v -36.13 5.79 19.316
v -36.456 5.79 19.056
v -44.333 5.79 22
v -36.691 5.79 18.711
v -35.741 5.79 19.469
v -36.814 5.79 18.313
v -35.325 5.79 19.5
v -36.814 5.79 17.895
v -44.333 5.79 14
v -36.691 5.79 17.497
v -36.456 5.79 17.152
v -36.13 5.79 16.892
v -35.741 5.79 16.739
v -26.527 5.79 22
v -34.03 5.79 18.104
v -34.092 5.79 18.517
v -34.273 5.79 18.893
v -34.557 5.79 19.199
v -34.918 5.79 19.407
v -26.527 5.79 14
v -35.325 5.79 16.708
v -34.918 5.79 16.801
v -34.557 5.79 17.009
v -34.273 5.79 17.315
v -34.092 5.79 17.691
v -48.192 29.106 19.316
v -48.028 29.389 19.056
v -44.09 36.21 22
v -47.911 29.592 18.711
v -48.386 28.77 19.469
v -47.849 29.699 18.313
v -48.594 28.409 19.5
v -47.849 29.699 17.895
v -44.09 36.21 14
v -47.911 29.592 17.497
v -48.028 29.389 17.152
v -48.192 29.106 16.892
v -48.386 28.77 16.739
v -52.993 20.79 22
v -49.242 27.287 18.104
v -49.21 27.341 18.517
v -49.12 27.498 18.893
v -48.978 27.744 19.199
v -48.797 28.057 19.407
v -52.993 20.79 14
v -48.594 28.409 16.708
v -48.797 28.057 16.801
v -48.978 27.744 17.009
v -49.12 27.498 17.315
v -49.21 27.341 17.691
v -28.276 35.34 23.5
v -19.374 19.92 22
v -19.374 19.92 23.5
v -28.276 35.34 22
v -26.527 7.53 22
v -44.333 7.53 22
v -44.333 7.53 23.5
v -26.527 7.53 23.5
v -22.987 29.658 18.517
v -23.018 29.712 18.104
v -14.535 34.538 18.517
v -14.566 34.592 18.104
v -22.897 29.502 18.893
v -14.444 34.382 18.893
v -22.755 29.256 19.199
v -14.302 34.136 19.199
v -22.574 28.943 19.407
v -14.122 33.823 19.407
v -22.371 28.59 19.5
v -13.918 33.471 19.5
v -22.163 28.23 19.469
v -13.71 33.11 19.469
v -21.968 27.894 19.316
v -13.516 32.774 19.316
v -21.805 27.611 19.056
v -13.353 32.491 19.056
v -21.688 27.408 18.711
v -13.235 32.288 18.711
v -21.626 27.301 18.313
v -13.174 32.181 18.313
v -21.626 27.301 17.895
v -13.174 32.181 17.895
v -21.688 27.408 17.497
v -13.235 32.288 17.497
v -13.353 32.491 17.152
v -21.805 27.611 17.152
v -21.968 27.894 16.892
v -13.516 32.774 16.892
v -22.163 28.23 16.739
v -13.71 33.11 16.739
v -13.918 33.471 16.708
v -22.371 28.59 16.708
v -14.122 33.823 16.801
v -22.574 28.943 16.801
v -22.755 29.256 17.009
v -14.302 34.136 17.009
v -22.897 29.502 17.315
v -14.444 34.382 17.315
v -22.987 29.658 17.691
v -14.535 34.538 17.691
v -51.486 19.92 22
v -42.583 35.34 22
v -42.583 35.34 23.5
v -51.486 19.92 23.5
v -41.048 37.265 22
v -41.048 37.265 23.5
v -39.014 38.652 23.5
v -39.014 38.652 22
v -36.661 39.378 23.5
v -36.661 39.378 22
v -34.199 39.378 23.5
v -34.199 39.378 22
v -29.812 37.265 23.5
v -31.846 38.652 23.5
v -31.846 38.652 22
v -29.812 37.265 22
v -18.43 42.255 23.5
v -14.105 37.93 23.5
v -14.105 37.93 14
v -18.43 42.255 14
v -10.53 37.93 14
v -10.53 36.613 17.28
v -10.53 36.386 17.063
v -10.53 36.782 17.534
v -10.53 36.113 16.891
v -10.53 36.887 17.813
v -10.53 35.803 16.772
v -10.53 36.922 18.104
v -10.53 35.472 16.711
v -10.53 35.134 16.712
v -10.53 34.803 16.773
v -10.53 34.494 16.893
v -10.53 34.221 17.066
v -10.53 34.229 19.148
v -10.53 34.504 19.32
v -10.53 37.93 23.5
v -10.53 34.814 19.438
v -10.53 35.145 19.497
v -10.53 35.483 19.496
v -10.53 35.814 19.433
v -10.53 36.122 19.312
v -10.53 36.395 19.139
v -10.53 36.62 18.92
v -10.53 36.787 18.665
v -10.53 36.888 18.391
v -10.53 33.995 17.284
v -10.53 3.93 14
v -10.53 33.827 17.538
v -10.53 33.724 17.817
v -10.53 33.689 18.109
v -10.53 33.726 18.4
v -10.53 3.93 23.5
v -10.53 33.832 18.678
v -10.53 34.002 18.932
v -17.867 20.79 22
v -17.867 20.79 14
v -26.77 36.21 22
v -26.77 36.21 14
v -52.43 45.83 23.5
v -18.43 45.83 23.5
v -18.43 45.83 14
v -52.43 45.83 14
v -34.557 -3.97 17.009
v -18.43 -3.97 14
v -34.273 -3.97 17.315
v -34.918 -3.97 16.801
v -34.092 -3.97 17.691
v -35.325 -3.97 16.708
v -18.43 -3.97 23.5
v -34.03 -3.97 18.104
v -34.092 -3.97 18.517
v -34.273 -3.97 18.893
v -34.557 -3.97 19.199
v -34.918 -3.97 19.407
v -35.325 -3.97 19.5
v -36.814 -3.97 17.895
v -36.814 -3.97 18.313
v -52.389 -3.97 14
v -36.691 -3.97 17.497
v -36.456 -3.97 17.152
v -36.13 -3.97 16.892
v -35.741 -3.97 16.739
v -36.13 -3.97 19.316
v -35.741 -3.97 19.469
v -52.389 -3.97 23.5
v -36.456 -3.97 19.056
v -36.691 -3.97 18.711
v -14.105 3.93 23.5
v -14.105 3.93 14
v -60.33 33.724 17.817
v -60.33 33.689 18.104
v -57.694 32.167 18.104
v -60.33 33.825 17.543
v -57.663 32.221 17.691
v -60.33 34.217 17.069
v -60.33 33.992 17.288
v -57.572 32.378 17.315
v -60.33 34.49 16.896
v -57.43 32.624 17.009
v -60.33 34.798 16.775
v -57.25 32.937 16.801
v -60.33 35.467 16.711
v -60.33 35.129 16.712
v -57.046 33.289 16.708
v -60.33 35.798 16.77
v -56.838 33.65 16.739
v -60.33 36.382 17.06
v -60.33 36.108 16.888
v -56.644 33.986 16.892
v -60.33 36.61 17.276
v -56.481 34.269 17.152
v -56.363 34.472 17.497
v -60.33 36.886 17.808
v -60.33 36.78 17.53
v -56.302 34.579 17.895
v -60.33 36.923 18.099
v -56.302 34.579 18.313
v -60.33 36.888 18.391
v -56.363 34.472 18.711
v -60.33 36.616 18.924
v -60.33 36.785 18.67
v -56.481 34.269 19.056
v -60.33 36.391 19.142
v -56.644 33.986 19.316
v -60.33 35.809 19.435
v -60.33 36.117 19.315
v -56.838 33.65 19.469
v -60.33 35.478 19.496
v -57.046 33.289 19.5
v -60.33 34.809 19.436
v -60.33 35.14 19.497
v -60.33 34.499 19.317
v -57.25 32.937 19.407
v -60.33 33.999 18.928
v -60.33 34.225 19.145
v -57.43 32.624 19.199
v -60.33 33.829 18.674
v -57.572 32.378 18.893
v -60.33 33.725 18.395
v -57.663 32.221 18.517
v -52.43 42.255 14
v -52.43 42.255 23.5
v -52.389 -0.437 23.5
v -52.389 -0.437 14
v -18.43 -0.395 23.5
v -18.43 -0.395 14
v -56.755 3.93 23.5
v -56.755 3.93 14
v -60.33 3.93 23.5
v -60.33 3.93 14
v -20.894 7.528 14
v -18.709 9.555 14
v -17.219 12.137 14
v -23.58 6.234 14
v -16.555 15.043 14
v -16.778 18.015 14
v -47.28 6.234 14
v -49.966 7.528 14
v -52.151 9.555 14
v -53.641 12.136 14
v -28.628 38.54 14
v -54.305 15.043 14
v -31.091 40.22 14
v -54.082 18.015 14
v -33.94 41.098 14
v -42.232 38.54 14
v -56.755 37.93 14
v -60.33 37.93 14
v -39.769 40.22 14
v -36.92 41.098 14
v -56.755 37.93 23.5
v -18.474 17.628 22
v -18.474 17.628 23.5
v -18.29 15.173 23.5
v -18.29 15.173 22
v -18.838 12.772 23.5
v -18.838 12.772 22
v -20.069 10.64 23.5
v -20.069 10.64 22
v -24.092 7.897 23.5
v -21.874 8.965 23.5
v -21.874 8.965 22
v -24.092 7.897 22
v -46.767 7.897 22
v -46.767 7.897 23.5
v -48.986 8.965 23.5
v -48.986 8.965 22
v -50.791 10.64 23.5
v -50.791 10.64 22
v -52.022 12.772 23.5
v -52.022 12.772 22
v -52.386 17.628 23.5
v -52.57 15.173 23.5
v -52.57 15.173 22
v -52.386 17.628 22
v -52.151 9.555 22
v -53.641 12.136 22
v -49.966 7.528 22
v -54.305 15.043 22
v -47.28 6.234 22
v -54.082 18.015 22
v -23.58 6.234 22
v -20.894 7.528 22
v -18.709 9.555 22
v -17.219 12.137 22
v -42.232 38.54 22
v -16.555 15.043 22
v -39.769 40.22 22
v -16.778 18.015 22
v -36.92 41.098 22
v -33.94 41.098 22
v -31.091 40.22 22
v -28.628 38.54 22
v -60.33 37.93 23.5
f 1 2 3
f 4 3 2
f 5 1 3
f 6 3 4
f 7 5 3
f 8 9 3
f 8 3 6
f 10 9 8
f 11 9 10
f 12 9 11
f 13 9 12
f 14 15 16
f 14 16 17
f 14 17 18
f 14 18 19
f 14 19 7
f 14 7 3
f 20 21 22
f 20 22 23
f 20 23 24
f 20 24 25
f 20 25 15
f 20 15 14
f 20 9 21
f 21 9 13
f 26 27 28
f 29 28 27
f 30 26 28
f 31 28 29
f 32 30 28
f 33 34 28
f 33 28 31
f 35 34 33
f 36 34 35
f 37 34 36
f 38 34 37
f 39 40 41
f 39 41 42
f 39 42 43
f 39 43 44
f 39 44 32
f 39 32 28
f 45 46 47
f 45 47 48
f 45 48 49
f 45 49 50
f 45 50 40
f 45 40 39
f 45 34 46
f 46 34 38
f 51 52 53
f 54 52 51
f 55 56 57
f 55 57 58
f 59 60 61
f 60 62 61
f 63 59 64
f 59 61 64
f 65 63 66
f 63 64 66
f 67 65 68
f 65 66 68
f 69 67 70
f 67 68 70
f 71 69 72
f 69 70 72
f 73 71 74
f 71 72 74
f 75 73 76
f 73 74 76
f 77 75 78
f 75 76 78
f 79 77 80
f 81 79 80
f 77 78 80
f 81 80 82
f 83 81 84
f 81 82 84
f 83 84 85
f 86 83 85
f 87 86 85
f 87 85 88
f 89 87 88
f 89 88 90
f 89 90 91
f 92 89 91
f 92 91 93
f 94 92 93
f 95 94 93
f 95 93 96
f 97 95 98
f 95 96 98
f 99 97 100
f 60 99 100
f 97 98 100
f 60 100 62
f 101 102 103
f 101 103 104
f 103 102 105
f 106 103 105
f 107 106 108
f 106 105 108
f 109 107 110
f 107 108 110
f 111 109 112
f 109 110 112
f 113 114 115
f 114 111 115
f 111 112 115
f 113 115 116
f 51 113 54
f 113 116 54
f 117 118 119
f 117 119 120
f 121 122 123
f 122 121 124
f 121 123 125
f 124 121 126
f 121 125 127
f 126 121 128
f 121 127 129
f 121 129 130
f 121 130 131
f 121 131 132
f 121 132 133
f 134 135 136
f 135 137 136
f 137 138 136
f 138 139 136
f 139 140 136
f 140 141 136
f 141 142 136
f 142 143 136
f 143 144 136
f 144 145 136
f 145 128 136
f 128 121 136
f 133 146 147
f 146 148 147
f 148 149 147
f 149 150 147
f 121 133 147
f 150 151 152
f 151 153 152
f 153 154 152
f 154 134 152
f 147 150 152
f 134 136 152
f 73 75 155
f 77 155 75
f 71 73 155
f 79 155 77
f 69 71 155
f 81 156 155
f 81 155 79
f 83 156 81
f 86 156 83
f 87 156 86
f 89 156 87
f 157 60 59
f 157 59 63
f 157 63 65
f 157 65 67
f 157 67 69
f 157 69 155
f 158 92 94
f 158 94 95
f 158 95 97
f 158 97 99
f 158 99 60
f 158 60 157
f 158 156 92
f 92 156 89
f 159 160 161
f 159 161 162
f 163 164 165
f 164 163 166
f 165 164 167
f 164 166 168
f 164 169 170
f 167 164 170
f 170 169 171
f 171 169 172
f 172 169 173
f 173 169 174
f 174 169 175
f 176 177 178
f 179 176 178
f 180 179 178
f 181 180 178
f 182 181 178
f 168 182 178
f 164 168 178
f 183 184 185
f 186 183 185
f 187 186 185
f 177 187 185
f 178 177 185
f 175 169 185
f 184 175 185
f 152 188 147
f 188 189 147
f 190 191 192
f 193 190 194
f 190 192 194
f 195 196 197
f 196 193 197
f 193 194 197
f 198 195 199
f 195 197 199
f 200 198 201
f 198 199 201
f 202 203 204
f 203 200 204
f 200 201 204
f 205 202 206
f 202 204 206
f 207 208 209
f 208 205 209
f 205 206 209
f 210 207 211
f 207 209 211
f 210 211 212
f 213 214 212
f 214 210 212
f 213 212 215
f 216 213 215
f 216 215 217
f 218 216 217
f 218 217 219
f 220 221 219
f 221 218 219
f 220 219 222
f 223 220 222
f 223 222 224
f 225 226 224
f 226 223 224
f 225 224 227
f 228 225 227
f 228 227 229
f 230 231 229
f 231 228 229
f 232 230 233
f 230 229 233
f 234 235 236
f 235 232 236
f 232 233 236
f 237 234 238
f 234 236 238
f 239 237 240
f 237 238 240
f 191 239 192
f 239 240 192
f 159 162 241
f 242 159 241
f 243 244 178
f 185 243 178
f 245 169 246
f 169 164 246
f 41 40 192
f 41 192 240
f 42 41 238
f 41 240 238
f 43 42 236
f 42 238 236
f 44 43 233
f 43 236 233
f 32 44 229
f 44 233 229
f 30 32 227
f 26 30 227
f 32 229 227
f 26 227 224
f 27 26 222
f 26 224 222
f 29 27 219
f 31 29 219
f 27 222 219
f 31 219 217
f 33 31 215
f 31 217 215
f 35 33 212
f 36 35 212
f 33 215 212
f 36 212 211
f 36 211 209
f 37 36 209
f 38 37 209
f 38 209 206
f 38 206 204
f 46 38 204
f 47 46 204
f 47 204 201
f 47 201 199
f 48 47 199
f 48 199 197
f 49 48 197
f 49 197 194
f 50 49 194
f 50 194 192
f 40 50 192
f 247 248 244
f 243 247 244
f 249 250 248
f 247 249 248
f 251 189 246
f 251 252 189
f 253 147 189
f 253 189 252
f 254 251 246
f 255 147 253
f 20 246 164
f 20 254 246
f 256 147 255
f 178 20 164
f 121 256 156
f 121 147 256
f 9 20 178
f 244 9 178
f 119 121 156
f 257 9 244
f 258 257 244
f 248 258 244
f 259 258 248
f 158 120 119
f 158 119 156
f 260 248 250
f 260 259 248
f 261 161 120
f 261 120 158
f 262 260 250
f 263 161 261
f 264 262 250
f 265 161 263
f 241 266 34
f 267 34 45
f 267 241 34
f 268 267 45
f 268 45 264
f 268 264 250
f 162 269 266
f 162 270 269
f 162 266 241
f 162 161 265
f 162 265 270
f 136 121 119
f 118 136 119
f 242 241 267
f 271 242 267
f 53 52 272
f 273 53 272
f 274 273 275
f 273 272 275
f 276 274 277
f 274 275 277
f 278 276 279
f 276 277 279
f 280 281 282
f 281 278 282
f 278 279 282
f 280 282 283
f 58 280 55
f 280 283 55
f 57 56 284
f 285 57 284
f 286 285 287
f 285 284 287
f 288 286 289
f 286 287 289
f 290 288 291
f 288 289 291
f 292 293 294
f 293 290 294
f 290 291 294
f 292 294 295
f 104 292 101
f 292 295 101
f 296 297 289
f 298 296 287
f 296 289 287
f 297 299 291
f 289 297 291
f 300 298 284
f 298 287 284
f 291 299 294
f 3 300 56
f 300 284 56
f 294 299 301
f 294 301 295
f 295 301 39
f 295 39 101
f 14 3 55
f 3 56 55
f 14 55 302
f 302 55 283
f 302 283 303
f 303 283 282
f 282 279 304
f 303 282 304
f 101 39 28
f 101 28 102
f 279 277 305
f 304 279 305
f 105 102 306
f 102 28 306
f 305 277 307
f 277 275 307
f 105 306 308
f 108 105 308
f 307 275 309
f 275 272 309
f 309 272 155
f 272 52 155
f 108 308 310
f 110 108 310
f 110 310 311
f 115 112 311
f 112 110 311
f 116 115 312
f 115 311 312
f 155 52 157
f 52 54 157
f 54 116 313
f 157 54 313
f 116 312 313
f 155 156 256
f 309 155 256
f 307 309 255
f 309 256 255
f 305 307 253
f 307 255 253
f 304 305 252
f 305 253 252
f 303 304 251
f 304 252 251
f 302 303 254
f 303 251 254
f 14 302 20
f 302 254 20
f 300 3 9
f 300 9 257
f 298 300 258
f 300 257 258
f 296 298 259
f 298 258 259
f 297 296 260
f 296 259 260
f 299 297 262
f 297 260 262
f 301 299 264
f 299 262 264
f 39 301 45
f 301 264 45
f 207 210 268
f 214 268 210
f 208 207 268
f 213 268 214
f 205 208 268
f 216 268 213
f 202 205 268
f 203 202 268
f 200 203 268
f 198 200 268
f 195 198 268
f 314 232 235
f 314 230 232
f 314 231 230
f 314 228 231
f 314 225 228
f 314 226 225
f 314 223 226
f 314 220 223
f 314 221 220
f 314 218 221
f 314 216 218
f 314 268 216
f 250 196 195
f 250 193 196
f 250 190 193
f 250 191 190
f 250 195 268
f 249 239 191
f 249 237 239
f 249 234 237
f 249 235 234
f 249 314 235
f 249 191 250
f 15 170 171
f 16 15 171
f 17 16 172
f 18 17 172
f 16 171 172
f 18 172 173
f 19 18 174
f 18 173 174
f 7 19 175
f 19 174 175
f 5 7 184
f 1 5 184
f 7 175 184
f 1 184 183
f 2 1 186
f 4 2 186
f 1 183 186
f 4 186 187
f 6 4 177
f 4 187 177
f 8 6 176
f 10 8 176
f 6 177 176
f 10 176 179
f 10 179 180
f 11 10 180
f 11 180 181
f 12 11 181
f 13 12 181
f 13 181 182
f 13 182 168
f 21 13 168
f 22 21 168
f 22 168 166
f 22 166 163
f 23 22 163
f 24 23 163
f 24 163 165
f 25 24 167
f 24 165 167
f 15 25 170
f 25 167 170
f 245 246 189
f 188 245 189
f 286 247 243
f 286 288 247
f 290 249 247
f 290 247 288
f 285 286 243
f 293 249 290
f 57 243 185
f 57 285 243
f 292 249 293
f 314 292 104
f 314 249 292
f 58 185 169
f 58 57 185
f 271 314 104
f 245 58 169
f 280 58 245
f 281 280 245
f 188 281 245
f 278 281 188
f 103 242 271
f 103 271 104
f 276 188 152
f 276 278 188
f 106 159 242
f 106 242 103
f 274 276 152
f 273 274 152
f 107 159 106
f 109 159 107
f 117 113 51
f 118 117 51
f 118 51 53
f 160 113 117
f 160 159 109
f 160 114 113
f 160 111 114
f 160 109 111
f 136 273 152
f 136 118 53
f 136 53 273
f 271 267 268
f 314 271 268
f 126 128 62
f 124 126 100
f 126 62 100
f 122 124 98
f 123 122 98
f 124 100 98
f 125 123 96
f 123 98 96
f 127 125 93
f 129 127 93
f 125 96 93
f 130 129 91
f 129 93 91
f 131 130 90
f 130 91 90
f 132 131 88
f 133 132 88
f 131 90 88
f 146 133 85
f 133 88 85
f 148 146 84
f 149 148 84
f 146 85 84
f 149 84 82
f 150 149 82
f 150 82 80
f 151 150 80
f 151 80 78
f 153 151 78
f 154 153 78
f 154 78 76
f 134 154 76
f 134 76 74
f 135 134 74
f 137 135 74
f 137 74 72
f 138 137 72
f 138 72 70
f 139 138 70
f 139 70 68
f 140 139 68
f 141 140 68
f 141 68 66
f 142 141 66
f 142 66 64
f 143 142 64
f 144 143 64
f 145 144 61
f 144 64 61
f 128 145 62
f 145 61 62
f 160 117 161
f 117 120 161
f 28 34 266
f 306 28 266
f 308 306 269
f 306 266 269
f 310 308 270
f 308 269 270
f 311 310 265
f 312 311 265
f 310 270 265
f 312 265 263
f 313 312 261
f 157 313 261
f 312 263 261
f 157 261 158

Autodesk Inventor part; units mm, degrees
ref_plane "YZ Plane" through (0, 0, 0) normal (1, 0, 0) x (0, 1, 0)
ref_plane "XZ Plane" through (0, 0, 0) normal (0, 1, 0) x (-1, 0, 0)
ref_plane "Work Plane1" through (-56.3599, 0, 22) normal (0, 0, -1) x (-1, 0, 0)
sketch "Sketch1" plane through (-56.3599, 0, 22) normal (0, 0, -1) x (-1, 0, 0)
  line L0 (-4.0299, -0.3538) -> (-2.2322, 1.4439) construction
  arc A0 (-1.4439, 2.2322) -> (-2.2322, 1.4439) centre (-0.9299, 0.9299) ccw construction
  line L1 (-1.4439, 2.2322) -> (0.3538, 4.0299) construction
  line L2 (-37.8299, 42.8299) -> (-37.8299, 37.8299) construction
  line L3 (-37.8299, 37.8299) -> (-42.9208, 37.8299) construction
  line L4 (-37.8299, 42.2137) -> (-37.8299, 45.8299) construction
  line L5 (-37.8299, 45.8299) -> (-4.0299, 45.8299) construction
  line L6 (-4.0299, 45.8299) -> (-4.0299, 42.2137) construction
  line L7 (-4.0299, 4.0299) -> (0.3538, 4.0299) projected
  circle A1 centre (-20.9299, 20.9299) radius 17.5 projected
  line L8 (-20.9299, 58.9723) -> (17.1124, 20.9299) construction
  line L9 (17.1124, 20.9299) -> (-20.9299, -17.1124) construction
  line L10 (-20.9299, -17.1124) -> (-58.9723, 20.9299) construction
  line L11 (-58.9723, 20.9299) -> (-20.9299, 58.9723) construction
  line L12 (-20.9299, 58.9723) -> (-20.9299, -17.1124) construction
  line L13 (17.1124, 20.9299) -> (-58.9723, 20.9299) construction
  line L14 (-20.9299, 58.9723) -> (32.8701, 58.9723) construction
  line L15 (-43.4299, 43.4299) -> (1.5701, 43.4299) construction
  line L16 (1.5701, 43.4299) -> (1.5701, -1.5701) construction
  line L17 (1.5701, -1.5701) -> (-43.4299, -1.5701) construction
  line L18 (-43.4299, -1.5701) -> (-43.4299, 43.4299) construction
  line L19 (-43.4299, 43.4299) -> (1.5701, -1.5701) construction
  line L20 (1.5701, 43.4299) -> (-43.4299, -1.5701) construction
  line L21 (-43.4299, 5.3876) -> (-43.4299, 36.4723)
  line L22 (-43.4299, 36.4723) -> (-36.4723, 43.4299)
  line L23 (-36.4723, 43.4299) -> (-5.3876, 43.4299)
  line L24 (-5.3876, 43.4299) -> (1.5701, 36.4723)
  line L25 (1.5701, 36.4723) -> (1.5701, 5.3876)
  line L26 (1.5701, 5.3876) -> (-5.3876, -1.5701)
  line L27 (-5.3876, -1.5701) -> (-36.4723, -1.5701)
  line L28 (-36.4723, -1.5701) -> (-43.4299, 5.3876)
  line L29 (-4.0299, 42.2137) -> (-37.8299, 42.2137) projected
  line L30 (-4.0299, -0.3538) -> (-4.0299, 4.0299) projected
  circle A2 centre (-20.9299, 20.9299) radius 1.5
  line L31 (-10.9299, 10.9299) -> (-30.9299, 10.9299) construction
  line L32 (-30.9299, 10.9299) -> (-30.9299, 30.9299) construction
  line L33 (-30.9299, 30.9299) -> (-10.9299, 30.9299) construction
  line L34 (-10.9299, 30.9299) -> (-10.9299, 10.9299) construction
  line L35 (-10.9299, 10.9299) -> (-30.9299, 30.9299) construction
  line L36 (-30.9299, 10.9299) -> (-10.9299, 30.9299) construction
  circle A3 centre (-30.9299, 30.9299) radius 1.4
  circle A4 centre (-30.9299, 10.9299) radius 1.4
  circle A5 centre (-10.9299, 10.9299) radius 1.4
  line L37 (-45.8299, 37.8299) -> (-42.0723, 37.8299) construction
  line L38 (-42.1723, 37.7299) -> (-45.8299, 37.7299)
  line L39 (-45.8299, 37.7299) -> (-45.8299, 4.1299)
  line L40 (-45.8299, 4.1299) -> (-42.1723, 4.1299)
  line L41 (-42.1723, 4.1299) -> (-42.1723, 37.7299)
  line L42 (-45.8299, 4.0299) -> (-42.0723, 4.0299) construction
  line L43 (-45.8299, 37.8299) -> (-42.0723, 37.8299) projected
  line L44 (-37.7299, 45.8299) -> (-4.1299, 45.8299)
  line L45 (-4.1299, 45.8299) -> (-4.1299, 42.1723)
  line L46 (-4.1299, 42.1723) -> (-37.7299, 42.1723)
  line L47 (-37.7299, 42.1723) -> (-37.7299, 45.8299)
  line L48 (0.4701, 37.8299) -> (0.4701, 4.0299) construction
  line L49 (0.4701, 4.0299) -> (3.9701, 4.0299) construction
  line L50 (3.9701, 37.8299) -> (3.9701, 4.0299) construction
  line L51 (0.4701, 37.8299) -> (3.9701, 37.8299) construction
  line L52 (-45.8299, -3.9701) -> (-4.0299, -3.9701) construction
  line L53 (0.3124, 37.7299) -> (3.9701, 37.7299)
  line L54 (3.9701, 37.7299) -> (3.9701, 4.1299)
  line L55 (3.9701, 4.1299) -> (0.3124, 4.1299)
  line L56 (0.3124, 4.1299) -> (0.3124, 37.7299)
  line L57 (-4.1713, -0.3538) -> (-37.7299, -0.3538)
  line L58 (-37.7299, -0.3538) -> (-37.7299, -3.9701)
  line L59 (-37.7299, -3.9701) -> (-4.1713, -3.9701)
  line L60 (-4.1713, -3.9701) -> (-4.1713, -0.3538)
  point P0 (-37.8299, 4.0299)
  dimension "d18" = 53.8
  dimension "d19" = 45
  dimension "d20" = 53.8
  dimension "d21" = 45
  dimension "d22" = 45
  dimension "d30" = 20
  dimension "d31" = 20
  dimension "d32" = 2.8
  dimension "d33" = 2.8
  dimension "d34" = 2.8
  dimension "d35" = 3
  dimension "d36" = 0.1
  dimension "d37" = 0.1
  dimension "d38" = 0.1
  dimension "d39" = 0.1
extrude "Extrusion1" add sketch "Sketch1" along normal blind 8 contours L30 L26 L57 L28 L41 L22 L46 L24 L56 L7 | L7 L26 L30 | L56 L24 L25 L26 | L26 L25 L24 L53 L54 L55 | L60 L59 L58 L57 L28 L27 L26 | L26 L27 L28 L57 | L46 L22 L29 L24 | L24 L29 L45 | L40 L39 L38 L22 L21 L28 | L28 L21 L22 L41 | L29 L22 L23 L24 | L24 L23 L22 L29 L47 L44 L45 | L47 L29 L22 | A1 | A2 | A3 | A4 | A5
sketch "Skizze4" plane through (-56.3599, 0, 14) normal (0, 0, -1) x (-1, 0, 0)
  line L0 (-37.7299, 42.1723) -> (-42.1723, 37.7299) projected
  line L1 (-42.1723, 37.7299) -> (-45.8299, 37.7299) projected
  line L2 (-45.8299, 37.7299) -> (-45.8299, 4.1299) construction
  line L3 (-45.8299, 4.1299) -> (-42.1723, 4.1299) projected
  line L4 (-42.1723, 4.1299) -> (-37.6885, -0.3538) projected
  line L5 (-37.6885, -0.3538) -> (-37.7299, -0.3538) projected
  line L6 (-37.7299, -0.3538) -> (-37.7299, -3.9701) projected
  line L7 (-37.7299, -3.9701) -> (-4.1713, -3.9701) construction
  line L8 (-4.1713, -3.9701) -> (-4.1713, -0.3538) projected
  line L9 (-4.1713, -0.3538) -> (0.3124, 4.1299) projected
  line L10 (0.3124, 4.1299) -> (3.9701, 4.1299) projected
  line L11 (3.9701, 4.1299) -> (3.9701, 37.7299) construction
  line L12 (3.9701, 37.7299) -> (0.3124, 37.7299) projected
  line L13 (0.3124, 37.7299) -> (-4.1299, 42.1723) projected
  line L14 (-4.1299, 42.1723) -> (-4.1299, 45.8299) projected
  line L15 (-4.1299, 45.8299) -> (-37.7299, 45.8299) construction
  line L16 (-37.7299, 45.8299) -> (-37.7299, 42.1723) projected
  line L17 (-37.9299, 46.0299) -> (-3.9299, 46.0299) construction
  line L18 (-3.9299, 46.0299) -> (-3.9299, 42.2551)
  line L19 (-3.9299, 42.2551) -> (0.3953, 37.9299)
  line L20 (0.3953, 37.9299) -> (4.1701, 37.9299)
  line L21 (4.1701, 37.9299) -> (4.1701, 3.9299) construction
  line L22 (4.1701, 3.9299) -> (0.3953, 3.9299)
  line L23 (0.3953, 3.9299) -> (-3.9713, -0.4367)
  line L24 (-3.9713, -0.4367) -> (-3.9713, -4.1701)
  line L25 (-3.9713, -4.1701) -> (-37.9299, -4.1701) construction
  line L26 (-37.9299, -4.1701) -> (-37.9299, -0.3953)
  line L27 (-37.9299, -0.3953) -> (-42.2551, 3.9299)
  line L28 (-42.2551, 3.9299) -> (-46.0299, 3.9299)
  line L29 (-46.0299, 3.9299) -> (-46.0299, 37.9299) construction
  line L30 (-46.0299, 37.9299) -> (-42.2551, 37.9299)
  line L31 (-42.2551, 37.9299) -> (-37.9299, 42.2551)
  line L32 (-37.9299, 42.2551) -> (-37.9299, 46.0299)
  line L33 (-45.8299, 37.7299) -> (-45.8299, 37.9299)
  line L34 (-4.1299, 45.8299) -> (-37.7299, 45.8299) projected
  line L35 (-37.7299, 45.8299) -> (-37.9299, 45.8299)
  line L36 (-4.1299, 45.8299) -> (-3.9299, 45.8299)
  line L37 (3.9701, 37.7299) -> (3.9701, 37.9299)
  line L38 (3.9701, 4.1299) -> (3.9701, 37.7299) projected
  line L39 (3.9701, 4.1299) -> (3.9701, 3.9299)
  line L40 (-4.1713, -3.9701) -> (-3.9713, -3.9701)
  line L41 (-37.7299, -3.9701) -> (-37.9299, -3.9701)
  line L42 (-45.8299, 4.1299) -> (-45.8299, 3.9299)
  point P0 (-56.3599, 0)
  dimension "d40" = 0.2
extrude "IM_offset" add sketch "Skizze4" against normal up to surface (8 mm away)
ref_plane "Arbeitsebene5" through (-35.4299, 3.9299, 22) normal (-1, 0, 0) x (0, 0, 1)
ref_plane "Arbeitsebene6" through (-18.4299, 20.9299, 22) normal (0, 1, 0) x (-1, 0, 0)
sketch "Sketch33" plane through (-56.3599, 0, 14) normal (0, 0, -1) x (-1, 0, 0)
  circle A0 centre (-20.9299, 20.9299) radius 15.24 construction
  circle A1 centre (-20.9299, 20.9299) radius 15.14 construction
  line L0 (-12.0272, 5.7899) -> (-29.8327, 5.7899)
  line L1 (-38.4929, 20.7899) -> (-29.5902, 36.2099)
  line L2 (-12.2697, 36.2099) -> (-3.3669, 20.7899)
  line L3 (-42.2551, 3.9299) -> (-45.8299, 3.9299) projected
  arc A2 (-12.0272, 5.7899) -> (-3.3669, 20.7899) centre (-12.0272, 15.7899) ccw
  arc A3 (-38.4929, 20.7899) -> (-29.8327, 5.7899) centre (-29.8327, 15.7899) ccw
  arc A4 (-12.2697, 36.2099) -> (-29.5902, 36.2099) centre (-20.9299, 31.2099) ccw
  point P0 (-56.3599, 0)
  point P1 (5.2933, 5.7899)
  point P2 (-47.1532, 5.7899)
  point P3 (-20.9299, 51.2099)
  dimension "d184" = 0.1
  dimension "d185" = 0
  dimension "d186" = 10
extrude "Extrusion27" cut sketch "Sketch33" against normal blind 10
sketch "Sketch34" plane through (-56.3599, 0, 22) normal (0, 0, 1) x (1, 0, 0)
  arc A0 (29.8327, 5.7899) -> (38.4929, 20.7899) centre (29.8327, 15.7899) ccw projected
  line L0 (29.8327, 5.7899) -> (12.0272, 5.7899) projected
  arc A1 (3.3669, 20.7899) -> (12.0272, 5.7899) centre (12.0272, 15.7899) ccw projected
  line L1 (3.3669, 20.7899) -> (12.2697, 36.2099) projected
  arc A2 (29.5902, 36.2099) -> (12.2697, 36.2099) centre (20.9299, 31.2099) ccw projected
  line L2 (29.5902, 36.2099) -> (38.4929, 20.7899) projected
  line L3 (3.9713, -3.9701) -> (37.9299, -3.9701) projected
  line L4 (37.9299, -3.9701) -> (37.9299, -0.3953) projected
  line L5 (37.9299, -0.3953) -> (42.2551, 3.9299) projected
  line L6 (42.2551, 3.9299) -> (45.8299, 3.9299) projected
  line L7 (45.8299, 3.9299) -> (45.8299, 37.9299) projected
  line L8 (45.8299, 37.9299) -> (42.2551, 37.9299) projected
  line L9 (42.2551, 37.9299) -> (37.9299, 42.2551) projected
  line L10 (37.9299, 42.2551) -> (37.9299, 45.8299) projected
  line L11 (37.9299, 45.8299) -> (3.9299, 45.8299) projected
  line L12 (3.9299, 45.8299) -> (3.9299, 42.2551) projected
  line L13 (3.9299, 42.2551) -> (-0.3953, 37.9299) projected
  line L14 (-0.3953, 37.9299) -> (-3.9701, 37.9299) projected
  line L15 (-3.9701, 37.9299) -> (-3.9701, 3.9299) projected
  line L16 (-3.9701, 3.9299) -> (-0.3953, 3.9299) projected
  line L17 (-0.3953, 3.9299) -> (3.9713, -0.4367) projected
  line L18 (3.9713, -0.4367) -> (3.9713, -3.9701) projected
  circle A3 centre (20.9299, 20.9299) radius 13.5001 construction
  circle A4 centre (20.9299, 20.9299) radius 13.4001
  line L19 (12.0272, 7.5298) -> (29.8327, 7.5298)
  arc A5 (29.8327, 7.5298) -> (36.9861, 19.92) centre (29.8327, 15.7899) ccw
  line L20 (36.9861, 19.92) -> (28.0834, 35.34)
  arc A6 (28.0834, 35.34) -> (13.7765, 35.34) centre (20.9299, 31.2099) ccw
  line L21 (13.7765, 35.34) -> (4.8737, 19.92)
  arc A7 (4.8737, 19.92) -> (12.0272, 7.5298) centre (12.0272, 15.7899) ccw
  point P0 (56.3599, 0)
  dimension "d189" = 0.1
extrude "Extrusion28" add sketch "Sketch34" along normal blind 1.5 contours L0 A1 L1 A2 L2 A0 | L18 L17 L16 L15 L14 L13 L12 L11 L10 L9 L8 L7 L6 L5 L4 L3
sketch "Sketch35" plane through (-52.3885, -3.9701, 14) normal (0, -1, 0) x (1, 0, 0)
  line L0 (0, 0) -> (0, 9.5) projected
  line L1 (0, 0) -> (33.9586, 0) projected
  line L2 (33.9586, 0) -> (33.9586, 9.5) projected
  line L3 (0, 9.5) -> (33.9586, 9.5) projected
  circle A0 centre (16.9586, 4.104) radius 1.4
  point P0 (52.3885, -14)
  dimension "d192" = 2.8
extrude "Extrusion29" cut sketch "Sketch35" along normal mid plane 30 contours A0
pattern_circular "Circular Pattern2" count 3 over 360 about axis through (-35.4299, 20.9299, 22) along (0, 0, 1) of "Extrusion29"
properties part number "20_Cube_Insert_Filter_25mm"
